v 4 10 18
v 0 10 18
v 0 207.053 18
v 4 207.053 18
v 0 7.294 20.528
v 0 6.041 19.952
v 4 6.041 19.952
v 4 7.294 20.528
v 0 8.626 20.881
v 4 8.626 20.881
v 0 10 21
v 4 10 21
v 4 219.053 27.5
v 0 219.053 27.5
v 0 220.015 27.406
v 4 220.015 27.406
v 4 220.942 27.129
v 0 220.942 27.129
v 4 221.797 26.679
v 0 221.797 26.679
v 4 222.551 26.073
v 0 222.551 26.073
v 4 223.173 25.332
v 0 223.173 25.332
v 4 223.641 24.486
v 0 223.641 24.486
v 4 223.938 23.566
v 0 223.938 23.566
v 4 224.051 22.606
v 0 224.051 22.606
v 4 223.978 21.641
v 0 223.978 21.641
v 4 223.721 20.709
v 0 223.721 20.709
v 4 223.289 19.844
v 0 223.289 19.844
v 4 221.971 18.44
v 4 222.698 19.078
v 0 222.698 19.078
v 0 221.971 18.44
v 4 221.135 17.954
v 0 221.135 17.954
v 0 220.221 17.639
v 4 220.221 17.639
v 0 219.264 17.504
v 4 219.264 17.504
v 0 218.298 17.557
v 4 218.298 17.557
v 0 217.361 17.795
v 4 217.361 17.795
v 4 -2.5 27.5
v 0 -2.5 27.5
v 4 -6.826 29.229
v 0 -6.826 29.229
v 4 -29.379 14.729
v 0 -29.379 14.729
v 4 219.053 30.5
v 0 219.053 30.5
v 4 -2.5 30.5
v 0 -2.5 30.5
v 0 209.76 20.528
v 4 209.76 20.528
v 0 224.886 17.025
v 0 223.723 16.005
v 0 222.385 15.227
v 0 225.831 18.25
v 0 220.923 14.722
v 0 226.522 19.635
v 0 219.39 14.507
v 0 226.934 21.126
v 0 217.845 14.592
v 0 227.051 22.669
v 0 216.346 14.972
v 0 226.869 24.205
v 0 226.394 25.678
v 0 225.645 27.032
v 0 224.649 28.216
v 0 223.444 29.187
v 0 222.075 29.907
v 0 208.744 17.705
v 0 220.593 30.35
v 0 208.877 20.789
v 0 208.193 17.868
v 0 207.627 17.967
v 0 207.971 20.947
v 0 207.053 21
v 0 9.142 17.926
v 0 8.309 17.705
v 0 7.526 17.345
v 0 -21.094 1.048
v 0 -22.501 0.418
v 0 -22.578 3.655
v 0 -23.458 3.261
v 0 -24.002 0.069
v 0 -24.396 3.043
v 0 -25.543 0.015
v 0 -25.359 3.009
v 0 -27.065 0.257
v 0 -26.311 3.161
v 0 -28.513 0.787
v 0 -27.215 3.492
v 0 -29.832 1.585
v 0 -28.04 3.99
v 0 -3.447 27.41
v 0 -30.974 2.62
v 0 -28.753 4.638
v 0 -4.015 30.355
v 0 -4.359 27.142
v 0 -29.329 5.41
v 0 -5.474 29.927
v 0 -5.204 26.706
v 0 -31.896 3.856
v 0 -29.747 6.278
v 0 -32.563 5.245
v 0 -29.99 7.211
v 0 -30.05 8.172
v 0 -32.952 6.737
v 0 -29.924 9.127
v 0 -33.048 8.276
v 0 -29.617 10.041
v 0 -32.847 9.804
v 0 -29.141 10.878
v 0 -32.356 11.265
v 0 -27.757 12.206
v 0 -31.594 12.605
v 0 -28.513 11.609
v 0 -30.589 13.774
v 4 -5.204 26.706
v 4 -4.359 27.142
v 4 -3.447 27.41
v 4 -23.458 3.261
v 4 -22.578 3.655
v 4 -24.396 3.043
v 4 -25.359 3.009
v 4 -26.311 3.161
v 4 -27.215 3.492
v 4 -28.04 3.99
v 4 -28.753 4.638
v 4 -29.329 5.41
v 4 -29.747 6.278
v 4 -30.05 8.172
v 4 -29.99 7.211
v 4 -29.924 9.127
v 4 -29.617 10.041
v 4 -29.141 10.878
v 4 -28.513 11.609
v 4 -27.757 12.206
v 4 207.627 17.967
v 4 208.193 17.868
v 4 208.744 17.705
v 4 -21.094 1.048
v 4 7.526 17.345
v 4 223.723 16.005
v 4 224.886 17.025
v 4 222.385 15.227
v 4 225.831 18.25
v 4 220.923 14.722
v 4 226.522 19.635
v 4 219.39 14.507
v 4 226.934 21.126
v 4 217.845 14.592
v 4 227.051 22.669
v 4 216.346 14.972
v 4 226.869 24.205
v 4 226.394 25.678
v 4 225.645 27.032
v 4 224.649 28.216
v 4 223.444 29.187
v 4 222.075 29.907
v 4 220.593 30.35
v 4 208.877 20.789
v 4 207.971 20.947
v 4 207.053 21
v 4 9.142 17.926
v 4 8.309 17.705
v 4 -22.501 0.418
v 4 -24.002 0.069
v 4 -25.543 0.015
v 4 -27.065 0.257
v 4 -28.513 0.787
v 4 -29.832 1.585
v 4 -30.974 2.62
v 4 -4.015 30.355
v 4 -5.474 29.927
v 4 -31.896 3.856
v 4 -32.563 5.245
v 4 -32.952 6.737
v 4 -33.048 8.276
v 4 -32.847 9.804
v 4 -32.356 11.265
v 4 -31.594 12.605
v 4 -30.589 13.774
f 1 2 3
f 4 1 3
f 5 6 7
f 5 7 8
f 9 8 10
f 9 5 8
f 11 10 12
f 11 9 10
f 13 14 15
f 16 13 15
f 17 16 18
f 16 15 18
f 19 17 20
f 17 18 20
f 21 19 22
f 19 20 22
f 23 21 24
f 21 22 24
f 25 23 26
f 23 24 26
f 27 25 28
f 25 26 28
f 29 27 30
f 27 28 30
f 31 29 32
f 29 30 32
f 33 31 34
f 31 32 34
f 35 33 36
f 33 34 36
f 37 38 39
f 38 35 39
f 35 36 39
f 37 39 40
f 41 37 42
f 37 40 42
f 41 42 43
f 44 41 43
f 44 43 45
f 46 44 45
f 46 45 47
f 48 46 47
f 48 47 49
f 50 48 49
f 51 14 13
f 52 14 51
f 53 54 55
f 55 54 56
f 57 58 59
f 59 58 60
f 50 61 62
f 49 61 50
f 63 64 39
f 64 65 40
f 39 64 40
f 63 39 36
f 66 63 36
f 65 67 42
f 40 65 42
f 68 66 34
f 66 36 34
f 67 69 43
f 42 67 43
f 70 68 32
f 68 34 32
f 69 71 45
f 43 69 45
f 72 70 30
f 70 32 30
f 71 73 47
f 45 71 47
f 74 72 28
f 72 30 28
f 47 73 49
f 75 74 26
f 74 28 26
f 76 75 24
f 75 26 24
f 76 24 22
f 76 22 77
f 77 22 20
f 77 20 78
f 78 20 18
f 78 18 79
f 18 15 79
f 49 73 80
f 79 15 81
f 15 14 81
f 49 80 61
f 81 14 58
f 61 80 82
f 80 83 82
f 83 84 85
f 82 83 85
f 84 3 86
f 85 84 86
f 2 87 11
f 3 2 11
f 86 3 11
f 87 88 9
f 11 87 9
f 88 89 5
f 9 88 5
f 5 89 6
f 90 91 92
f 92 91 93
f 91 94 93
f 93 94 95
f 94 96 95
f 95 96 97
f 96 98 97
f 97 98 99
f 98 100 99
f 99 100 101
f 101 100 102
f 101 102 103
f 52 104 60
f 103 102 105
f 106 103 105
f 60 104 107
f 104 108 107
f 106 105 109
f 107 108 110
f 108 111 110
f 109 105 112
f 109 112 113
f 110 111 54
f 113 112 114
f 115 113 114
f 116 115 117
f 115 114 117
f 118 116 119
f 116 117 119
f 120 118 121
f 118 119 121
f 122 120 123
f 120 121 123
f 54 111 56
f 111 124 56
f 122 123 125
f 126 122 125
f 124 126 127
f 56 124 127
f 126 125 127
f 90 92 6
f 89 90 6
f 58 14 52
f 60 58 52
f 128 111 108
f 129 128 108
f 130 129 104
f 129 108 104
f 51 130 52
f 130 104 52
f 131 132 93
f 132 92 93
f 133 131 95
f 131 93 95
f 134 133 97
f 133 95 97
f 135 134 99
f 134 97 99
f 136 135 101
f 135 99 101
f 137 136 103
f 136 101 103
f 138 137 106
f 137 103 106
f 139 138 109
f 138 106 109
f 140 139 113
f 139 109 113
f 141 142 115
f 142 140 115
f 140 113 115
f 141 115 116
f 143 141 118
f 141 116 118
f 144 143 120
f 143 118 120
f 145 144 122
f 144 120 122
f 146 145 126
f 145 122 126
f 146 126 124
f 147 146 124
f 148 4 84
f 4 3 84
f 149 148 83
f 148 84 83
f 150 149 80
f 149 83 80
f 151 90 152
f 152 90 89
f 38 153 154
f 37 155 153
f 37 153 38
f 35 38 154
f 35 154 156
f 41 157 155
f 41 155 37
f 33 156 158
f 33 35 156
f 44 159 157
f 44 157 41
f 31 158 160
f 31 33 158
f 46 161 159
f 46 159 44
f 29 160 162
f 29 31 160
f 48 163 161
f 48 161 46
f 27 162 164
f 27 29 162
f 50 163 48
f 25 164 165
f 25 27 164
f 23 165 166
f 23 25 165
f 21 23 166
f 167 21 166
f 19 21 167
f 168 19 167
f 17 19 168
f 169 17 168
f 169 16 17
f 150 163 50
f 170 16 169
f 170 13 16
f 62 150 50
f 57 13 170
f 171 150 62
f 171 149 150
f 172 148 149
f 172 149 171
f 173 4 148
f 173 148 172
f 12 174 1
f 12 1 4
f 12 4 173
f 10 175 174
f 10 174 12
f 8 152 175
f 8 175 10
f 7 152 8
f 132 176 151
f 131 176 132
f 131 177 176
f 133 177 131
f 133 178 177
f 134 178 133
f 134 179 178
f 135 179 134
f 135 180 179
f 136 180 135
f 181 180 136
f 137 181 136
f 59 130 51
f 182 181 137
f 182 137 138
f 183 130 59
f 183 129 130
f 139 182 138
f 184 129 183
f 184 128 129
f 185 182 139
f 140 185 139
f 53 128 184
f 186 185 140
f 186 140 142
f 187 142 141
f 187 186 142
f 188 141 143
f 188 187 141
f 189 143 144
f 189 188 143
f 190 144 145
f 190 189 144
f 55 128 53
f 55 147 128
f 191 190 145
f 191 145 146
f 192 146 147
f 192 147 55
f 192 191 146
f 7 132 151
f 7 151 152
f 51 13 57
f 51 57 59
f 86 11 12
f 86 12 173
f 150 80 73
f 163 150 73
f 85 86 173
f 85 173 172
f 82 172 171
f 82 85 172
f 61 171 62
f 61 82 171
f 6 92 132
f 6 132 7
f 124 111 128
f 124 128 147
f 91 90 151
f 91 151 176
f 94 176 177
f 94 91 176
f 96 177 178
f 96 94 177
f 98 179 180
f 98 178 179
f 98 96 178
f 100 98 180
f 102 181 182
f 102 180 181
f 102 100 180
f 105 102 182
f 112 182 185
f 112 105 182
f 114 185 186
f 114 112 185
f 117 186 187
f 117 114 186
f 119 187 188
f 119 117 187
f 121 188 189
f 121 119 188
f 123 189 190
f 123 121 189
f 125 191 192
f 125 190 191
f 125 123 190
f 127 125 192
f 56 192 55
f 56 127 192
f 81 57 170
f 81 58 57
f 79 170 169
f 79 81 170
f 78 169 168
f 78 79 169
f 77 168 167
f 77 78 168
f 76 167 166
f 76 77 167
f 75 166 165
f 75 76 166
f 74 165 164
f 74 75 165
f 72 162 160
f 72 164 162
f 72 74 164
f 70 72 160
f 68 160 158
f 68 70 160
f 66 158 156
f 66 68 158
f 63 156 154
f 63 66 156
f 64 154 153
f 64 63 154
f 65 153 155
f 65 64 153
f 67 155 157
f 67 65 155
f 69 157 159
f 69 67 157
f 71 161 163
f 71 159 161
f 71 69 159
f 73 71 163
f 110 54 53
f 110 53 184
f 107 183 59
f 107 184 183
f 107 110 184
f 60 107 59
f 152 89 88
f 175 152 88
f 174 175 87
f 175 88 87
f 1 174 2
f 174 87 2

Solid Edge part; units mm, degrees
sketch "Sketch1" plane through (0, 0, 0) normal (1, 0, 0) x (0, 1, 0)
  line L0 (219.0526, 30.5) -> (-2.5, 30.5)
  arc A0 (-2.5, 30.5) -> (-6.8265, 29.2292) centre (-2.5, 22.5) ccw
  line L1 (-6.8265, 29.2292) -> (-29.379, 14.7292)
  arc A1 (-29.379, 14.7292) -> (-21.0939, 1.0481) centre (-25.0526, 8) ccw
  line L2 (-21.0939, 1.0481) -> (7.5259, 17.345)
  arc A2 (7.5259, 17.345) -> (10, 18) centre (10, 13) cw
  line L3 (10, 18) -> (207.0526, 18)
  arc A3 (207.0526, 18) -> (208.7444, 17.7051) centre (207.0526, 13) cw
  line L4 (208.7444, 17.7051) -> (216.3457, 14.9719)
  arc A4 (216.3457, 14.9719) -> (219.0526, 30.5) centre (219.0526, 22.5) ccw
  line L5 (219.0526, 27.5) -> (-2.5, 27.5)
  arc A5 (-2.5, 27.5) -> (-5.204, 26.7057) centre (-2.5, 22.5) ccw
  line L6 (-5.204, 26.7057) -> (-27.7566, 12.2057)
  arc A6 (-27.7566, 12.2057) -> (-22.5784, 3.655) centre (-25.0526, 8) ccw
  line L7 (-22.5784, 3.655) -> (6.0414, 19.9519)
  arc A7 (6.0414, 19.9519) -> (10, 21) centre (10, 13) cw
  line L8 (10, 21) -> (207.0526, 21)
  arc A8 (207.0526, 21) -> (209.7595, 20.5281) centre (207.0526, 13) cw
  line L9 (209.7595, 20.5281) -> (217.3607, 17.7949)
  arc A9 (217.3607, 17.7949) -> (219.0526, 27.5) centre (219.0526, 22.5) ccw
  dimension "D1" = 1.5
  dimension "D2" = 1.5
  dimension "D3" = 1.5
  dimension "D4" = 1.5
  dimension "D5" = 1.5
  dimension "D6" = 1.5
extrude "Protrusion1" add sketch "Sketch1" along normal blind 4
properties material "Steel"
